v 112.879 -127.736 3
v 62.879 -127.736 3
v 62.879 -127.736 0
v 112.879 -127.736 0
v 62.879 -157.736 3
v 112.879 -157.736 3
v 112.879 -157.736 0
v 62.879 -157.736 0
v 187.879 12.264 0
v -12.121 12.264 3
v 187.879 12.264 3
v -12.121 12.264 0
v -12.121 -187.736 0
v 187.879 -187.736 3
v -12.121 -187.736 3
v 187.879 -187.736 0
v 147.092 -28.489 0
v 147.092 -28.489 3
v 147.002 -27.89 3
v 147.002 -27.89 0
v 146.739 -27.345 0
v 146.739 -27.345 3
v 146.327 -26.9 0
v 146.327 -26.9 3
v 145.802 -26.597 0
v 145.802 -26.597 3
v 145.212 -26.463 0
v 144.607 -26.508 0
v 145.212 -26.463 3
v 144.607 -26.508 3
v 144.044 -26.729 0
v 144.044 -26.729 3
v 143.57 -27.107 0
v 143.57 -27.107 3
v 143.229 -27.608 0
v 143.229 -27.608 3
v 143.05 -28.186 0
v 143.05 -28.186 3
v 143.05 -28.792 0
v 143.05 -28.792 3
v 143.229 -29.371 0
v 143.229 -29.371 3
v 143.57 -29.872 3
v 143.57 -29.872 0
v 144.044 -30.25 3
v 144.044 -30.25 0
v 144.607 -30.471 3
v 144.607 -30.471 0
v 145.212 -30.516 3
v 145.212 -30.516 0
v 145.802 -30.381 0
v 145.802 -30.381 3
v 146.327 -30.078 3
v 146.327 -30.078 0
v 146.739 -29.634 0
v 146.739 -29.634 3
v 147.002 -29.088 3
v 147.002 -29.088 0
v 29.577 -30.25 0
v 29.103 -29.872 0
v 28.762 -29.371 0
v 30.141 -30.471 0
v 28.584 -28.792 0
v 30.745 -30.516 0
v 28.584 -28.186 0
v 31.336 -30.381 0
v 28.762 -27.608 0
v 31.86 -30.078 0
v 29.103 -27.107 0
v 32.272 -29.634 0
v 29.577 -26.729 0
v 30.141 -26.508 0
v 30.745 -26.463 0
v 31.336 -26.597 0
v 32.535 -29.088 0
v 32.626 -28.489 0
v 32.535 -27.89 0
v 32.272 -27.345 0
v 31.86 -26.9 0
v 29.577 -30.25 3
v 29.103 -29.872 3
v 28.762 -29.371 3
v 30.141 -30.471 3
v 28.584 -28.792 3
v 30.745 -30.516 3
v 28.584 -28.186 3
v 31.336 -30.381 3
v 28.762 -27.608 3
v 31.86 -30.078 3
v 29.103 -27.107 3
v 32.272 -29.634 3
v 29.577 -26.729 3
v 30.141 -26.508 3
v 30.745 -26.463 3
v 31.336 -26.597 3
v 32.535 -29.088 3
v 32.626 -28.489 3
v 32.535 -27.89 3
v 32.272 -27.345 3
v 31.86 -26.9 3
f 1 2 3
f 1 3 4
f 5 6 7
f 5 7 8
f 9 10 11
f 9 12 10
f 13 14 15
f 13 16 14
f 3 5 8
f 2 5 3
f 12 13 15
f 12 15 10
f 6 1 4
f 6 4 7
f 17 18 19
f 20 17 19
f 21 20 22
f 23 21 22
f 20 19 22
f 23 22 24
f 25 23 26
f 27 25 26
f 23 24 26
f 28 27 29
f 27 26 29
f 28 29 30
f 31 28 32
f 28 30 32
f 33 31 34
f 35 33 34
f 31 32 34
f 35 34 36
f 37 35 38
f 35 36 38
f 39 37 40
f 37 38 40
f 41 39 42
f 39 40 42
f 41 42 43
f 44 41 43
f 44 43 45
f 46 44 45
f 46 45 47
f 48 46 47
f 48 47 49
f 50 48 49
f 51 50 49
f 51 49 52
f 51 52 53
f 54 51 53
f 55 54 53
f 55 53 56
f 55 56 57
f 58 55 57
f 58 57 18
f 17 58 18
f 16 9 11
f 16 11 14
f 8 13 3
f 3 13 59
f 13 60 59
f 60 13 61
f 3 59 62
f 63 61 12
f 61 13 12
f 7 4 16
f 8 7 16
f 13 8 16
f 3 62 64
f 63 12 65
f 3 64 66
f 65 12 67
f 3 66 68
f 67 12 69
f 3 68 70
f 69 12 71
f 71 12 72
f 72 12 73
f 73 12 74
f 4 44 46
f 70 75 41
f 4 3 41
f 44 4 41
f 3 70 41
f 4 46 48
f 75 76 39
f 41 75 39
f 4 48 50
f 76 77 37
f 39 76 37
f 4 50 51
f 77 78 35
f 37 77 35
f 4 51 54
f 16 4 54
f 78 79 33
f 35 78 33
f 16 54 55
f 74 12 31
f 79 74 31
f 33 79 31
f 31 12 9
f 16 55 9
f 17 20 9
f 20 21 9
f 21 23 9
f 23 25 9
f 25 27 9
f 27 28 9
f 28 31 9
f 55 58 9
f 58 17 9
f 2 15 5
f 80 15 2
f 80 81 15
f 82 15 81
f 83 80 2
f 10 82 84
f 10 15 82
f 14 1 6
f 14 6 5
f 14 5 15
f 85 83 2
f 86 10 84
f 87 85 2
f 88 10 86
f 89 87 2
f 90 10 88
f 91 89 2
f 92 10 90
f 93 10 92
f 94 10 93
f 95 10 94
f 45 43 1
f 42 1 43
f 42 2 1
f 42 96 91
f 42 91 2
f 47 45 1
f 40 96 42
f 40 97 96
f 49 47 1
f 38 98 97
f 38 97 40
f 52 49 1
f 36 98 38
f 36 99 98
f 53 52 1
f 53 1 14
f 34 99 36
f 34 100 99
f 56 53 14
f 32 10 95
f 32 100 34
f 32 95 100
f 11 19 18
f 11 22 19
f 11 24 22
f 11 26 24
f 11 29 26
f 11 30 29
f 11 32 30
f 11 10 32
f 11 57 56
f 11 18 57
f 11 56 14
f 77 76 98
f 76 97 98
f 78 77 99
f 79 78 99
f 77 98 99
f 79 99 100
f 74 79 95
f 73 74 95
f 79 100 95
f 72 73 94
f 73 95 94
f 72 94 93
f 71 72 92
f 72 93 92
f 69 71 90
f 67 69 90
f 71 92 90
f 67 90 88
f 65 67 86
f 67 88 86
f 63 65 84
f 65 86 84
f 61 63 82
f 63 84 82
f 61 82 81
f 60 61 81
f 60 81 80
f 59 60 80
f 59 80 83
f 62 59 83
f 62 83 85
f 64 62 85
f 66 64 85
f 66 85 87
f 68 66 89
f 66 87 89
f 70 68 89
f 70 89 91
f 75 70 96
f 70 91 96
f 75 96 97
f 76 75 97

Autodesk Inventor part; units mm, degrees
ref_plane "YZ Plane" through (0, 0, 0) normal (1, 0, 0) x (0, 1, 0)
ref_plane "XZ Plane" through (0, 0, 0) normal (0, 1, 0) x (-1, 0, 0)
ref_plane "XY Plane" through (0, 0, 0) normal (0, 0, 1) x (1, 0, 0)
sketch "Sketch1" plane through (0, 0, 0) normal (0, 0, 1) x (1, 0, 0)
  line L0 (-12.121, 12.2642) -> (187.879, 12.2642)
  line L1 (187.879, 12.2642) -> (187.879, -187.7358)
  line L2 (187.879, -187.7358) -> (-12.121, -187.7358)
  line L3 (-12.121, -187.7358) -> (-12.121, 12.2642)
  point P0 (0, 0)
  dimension "d0" = 200
  dimension "d1" = 200
  dimension "d2" = 200
extrude "Extrusion1" add sketch "Sketch1" along normal blind 3
sketch "Sketch2" plane through (0, 0, 3) normal (0, 0, 1) x (1, 0, 0)
  circle A0 centre (30.5932, -28.4894) radius 2.0324
  line L0 (187.879, -187.7358) -> (187.879, 12.2642) projected
  circle A1 centre (145.0597, -28.4894) radius 2.0324
  line L1 (62.879, -127.7358) -> (112.879, -127.7358)
  line L2 (112.879, -127.7358) -> (112.879, -157.7358)
  line L3 (112.879, -157.7358) -> (62.879, -157.7358)
  line L4 (62.879, -157.7358) -> (62.879, -127.7358)
  line L5 (-12.121, -187.7358) -> (187.879, -187.7358) projected
  line L6 (-12.121, 12.2642) -> (-12.121, -187.7358) projected
  point P0 (0, 0)
  point P1 (42.5932, -63.9945)
  point P2 (133.0597, -63.9945)
  point P3 (62.879, -142.7358)
  dimension "d14" = 12
  dimension "d15" = 12
  dimension "d16" = 50
  dimension "d17" = 30
  dimension "d18" = 30
  dimension "d19" = 75
extrude "Extrusion2" cut sketch "Sketch2" against normal blind 3
properties part number "facef" material "Glass"
